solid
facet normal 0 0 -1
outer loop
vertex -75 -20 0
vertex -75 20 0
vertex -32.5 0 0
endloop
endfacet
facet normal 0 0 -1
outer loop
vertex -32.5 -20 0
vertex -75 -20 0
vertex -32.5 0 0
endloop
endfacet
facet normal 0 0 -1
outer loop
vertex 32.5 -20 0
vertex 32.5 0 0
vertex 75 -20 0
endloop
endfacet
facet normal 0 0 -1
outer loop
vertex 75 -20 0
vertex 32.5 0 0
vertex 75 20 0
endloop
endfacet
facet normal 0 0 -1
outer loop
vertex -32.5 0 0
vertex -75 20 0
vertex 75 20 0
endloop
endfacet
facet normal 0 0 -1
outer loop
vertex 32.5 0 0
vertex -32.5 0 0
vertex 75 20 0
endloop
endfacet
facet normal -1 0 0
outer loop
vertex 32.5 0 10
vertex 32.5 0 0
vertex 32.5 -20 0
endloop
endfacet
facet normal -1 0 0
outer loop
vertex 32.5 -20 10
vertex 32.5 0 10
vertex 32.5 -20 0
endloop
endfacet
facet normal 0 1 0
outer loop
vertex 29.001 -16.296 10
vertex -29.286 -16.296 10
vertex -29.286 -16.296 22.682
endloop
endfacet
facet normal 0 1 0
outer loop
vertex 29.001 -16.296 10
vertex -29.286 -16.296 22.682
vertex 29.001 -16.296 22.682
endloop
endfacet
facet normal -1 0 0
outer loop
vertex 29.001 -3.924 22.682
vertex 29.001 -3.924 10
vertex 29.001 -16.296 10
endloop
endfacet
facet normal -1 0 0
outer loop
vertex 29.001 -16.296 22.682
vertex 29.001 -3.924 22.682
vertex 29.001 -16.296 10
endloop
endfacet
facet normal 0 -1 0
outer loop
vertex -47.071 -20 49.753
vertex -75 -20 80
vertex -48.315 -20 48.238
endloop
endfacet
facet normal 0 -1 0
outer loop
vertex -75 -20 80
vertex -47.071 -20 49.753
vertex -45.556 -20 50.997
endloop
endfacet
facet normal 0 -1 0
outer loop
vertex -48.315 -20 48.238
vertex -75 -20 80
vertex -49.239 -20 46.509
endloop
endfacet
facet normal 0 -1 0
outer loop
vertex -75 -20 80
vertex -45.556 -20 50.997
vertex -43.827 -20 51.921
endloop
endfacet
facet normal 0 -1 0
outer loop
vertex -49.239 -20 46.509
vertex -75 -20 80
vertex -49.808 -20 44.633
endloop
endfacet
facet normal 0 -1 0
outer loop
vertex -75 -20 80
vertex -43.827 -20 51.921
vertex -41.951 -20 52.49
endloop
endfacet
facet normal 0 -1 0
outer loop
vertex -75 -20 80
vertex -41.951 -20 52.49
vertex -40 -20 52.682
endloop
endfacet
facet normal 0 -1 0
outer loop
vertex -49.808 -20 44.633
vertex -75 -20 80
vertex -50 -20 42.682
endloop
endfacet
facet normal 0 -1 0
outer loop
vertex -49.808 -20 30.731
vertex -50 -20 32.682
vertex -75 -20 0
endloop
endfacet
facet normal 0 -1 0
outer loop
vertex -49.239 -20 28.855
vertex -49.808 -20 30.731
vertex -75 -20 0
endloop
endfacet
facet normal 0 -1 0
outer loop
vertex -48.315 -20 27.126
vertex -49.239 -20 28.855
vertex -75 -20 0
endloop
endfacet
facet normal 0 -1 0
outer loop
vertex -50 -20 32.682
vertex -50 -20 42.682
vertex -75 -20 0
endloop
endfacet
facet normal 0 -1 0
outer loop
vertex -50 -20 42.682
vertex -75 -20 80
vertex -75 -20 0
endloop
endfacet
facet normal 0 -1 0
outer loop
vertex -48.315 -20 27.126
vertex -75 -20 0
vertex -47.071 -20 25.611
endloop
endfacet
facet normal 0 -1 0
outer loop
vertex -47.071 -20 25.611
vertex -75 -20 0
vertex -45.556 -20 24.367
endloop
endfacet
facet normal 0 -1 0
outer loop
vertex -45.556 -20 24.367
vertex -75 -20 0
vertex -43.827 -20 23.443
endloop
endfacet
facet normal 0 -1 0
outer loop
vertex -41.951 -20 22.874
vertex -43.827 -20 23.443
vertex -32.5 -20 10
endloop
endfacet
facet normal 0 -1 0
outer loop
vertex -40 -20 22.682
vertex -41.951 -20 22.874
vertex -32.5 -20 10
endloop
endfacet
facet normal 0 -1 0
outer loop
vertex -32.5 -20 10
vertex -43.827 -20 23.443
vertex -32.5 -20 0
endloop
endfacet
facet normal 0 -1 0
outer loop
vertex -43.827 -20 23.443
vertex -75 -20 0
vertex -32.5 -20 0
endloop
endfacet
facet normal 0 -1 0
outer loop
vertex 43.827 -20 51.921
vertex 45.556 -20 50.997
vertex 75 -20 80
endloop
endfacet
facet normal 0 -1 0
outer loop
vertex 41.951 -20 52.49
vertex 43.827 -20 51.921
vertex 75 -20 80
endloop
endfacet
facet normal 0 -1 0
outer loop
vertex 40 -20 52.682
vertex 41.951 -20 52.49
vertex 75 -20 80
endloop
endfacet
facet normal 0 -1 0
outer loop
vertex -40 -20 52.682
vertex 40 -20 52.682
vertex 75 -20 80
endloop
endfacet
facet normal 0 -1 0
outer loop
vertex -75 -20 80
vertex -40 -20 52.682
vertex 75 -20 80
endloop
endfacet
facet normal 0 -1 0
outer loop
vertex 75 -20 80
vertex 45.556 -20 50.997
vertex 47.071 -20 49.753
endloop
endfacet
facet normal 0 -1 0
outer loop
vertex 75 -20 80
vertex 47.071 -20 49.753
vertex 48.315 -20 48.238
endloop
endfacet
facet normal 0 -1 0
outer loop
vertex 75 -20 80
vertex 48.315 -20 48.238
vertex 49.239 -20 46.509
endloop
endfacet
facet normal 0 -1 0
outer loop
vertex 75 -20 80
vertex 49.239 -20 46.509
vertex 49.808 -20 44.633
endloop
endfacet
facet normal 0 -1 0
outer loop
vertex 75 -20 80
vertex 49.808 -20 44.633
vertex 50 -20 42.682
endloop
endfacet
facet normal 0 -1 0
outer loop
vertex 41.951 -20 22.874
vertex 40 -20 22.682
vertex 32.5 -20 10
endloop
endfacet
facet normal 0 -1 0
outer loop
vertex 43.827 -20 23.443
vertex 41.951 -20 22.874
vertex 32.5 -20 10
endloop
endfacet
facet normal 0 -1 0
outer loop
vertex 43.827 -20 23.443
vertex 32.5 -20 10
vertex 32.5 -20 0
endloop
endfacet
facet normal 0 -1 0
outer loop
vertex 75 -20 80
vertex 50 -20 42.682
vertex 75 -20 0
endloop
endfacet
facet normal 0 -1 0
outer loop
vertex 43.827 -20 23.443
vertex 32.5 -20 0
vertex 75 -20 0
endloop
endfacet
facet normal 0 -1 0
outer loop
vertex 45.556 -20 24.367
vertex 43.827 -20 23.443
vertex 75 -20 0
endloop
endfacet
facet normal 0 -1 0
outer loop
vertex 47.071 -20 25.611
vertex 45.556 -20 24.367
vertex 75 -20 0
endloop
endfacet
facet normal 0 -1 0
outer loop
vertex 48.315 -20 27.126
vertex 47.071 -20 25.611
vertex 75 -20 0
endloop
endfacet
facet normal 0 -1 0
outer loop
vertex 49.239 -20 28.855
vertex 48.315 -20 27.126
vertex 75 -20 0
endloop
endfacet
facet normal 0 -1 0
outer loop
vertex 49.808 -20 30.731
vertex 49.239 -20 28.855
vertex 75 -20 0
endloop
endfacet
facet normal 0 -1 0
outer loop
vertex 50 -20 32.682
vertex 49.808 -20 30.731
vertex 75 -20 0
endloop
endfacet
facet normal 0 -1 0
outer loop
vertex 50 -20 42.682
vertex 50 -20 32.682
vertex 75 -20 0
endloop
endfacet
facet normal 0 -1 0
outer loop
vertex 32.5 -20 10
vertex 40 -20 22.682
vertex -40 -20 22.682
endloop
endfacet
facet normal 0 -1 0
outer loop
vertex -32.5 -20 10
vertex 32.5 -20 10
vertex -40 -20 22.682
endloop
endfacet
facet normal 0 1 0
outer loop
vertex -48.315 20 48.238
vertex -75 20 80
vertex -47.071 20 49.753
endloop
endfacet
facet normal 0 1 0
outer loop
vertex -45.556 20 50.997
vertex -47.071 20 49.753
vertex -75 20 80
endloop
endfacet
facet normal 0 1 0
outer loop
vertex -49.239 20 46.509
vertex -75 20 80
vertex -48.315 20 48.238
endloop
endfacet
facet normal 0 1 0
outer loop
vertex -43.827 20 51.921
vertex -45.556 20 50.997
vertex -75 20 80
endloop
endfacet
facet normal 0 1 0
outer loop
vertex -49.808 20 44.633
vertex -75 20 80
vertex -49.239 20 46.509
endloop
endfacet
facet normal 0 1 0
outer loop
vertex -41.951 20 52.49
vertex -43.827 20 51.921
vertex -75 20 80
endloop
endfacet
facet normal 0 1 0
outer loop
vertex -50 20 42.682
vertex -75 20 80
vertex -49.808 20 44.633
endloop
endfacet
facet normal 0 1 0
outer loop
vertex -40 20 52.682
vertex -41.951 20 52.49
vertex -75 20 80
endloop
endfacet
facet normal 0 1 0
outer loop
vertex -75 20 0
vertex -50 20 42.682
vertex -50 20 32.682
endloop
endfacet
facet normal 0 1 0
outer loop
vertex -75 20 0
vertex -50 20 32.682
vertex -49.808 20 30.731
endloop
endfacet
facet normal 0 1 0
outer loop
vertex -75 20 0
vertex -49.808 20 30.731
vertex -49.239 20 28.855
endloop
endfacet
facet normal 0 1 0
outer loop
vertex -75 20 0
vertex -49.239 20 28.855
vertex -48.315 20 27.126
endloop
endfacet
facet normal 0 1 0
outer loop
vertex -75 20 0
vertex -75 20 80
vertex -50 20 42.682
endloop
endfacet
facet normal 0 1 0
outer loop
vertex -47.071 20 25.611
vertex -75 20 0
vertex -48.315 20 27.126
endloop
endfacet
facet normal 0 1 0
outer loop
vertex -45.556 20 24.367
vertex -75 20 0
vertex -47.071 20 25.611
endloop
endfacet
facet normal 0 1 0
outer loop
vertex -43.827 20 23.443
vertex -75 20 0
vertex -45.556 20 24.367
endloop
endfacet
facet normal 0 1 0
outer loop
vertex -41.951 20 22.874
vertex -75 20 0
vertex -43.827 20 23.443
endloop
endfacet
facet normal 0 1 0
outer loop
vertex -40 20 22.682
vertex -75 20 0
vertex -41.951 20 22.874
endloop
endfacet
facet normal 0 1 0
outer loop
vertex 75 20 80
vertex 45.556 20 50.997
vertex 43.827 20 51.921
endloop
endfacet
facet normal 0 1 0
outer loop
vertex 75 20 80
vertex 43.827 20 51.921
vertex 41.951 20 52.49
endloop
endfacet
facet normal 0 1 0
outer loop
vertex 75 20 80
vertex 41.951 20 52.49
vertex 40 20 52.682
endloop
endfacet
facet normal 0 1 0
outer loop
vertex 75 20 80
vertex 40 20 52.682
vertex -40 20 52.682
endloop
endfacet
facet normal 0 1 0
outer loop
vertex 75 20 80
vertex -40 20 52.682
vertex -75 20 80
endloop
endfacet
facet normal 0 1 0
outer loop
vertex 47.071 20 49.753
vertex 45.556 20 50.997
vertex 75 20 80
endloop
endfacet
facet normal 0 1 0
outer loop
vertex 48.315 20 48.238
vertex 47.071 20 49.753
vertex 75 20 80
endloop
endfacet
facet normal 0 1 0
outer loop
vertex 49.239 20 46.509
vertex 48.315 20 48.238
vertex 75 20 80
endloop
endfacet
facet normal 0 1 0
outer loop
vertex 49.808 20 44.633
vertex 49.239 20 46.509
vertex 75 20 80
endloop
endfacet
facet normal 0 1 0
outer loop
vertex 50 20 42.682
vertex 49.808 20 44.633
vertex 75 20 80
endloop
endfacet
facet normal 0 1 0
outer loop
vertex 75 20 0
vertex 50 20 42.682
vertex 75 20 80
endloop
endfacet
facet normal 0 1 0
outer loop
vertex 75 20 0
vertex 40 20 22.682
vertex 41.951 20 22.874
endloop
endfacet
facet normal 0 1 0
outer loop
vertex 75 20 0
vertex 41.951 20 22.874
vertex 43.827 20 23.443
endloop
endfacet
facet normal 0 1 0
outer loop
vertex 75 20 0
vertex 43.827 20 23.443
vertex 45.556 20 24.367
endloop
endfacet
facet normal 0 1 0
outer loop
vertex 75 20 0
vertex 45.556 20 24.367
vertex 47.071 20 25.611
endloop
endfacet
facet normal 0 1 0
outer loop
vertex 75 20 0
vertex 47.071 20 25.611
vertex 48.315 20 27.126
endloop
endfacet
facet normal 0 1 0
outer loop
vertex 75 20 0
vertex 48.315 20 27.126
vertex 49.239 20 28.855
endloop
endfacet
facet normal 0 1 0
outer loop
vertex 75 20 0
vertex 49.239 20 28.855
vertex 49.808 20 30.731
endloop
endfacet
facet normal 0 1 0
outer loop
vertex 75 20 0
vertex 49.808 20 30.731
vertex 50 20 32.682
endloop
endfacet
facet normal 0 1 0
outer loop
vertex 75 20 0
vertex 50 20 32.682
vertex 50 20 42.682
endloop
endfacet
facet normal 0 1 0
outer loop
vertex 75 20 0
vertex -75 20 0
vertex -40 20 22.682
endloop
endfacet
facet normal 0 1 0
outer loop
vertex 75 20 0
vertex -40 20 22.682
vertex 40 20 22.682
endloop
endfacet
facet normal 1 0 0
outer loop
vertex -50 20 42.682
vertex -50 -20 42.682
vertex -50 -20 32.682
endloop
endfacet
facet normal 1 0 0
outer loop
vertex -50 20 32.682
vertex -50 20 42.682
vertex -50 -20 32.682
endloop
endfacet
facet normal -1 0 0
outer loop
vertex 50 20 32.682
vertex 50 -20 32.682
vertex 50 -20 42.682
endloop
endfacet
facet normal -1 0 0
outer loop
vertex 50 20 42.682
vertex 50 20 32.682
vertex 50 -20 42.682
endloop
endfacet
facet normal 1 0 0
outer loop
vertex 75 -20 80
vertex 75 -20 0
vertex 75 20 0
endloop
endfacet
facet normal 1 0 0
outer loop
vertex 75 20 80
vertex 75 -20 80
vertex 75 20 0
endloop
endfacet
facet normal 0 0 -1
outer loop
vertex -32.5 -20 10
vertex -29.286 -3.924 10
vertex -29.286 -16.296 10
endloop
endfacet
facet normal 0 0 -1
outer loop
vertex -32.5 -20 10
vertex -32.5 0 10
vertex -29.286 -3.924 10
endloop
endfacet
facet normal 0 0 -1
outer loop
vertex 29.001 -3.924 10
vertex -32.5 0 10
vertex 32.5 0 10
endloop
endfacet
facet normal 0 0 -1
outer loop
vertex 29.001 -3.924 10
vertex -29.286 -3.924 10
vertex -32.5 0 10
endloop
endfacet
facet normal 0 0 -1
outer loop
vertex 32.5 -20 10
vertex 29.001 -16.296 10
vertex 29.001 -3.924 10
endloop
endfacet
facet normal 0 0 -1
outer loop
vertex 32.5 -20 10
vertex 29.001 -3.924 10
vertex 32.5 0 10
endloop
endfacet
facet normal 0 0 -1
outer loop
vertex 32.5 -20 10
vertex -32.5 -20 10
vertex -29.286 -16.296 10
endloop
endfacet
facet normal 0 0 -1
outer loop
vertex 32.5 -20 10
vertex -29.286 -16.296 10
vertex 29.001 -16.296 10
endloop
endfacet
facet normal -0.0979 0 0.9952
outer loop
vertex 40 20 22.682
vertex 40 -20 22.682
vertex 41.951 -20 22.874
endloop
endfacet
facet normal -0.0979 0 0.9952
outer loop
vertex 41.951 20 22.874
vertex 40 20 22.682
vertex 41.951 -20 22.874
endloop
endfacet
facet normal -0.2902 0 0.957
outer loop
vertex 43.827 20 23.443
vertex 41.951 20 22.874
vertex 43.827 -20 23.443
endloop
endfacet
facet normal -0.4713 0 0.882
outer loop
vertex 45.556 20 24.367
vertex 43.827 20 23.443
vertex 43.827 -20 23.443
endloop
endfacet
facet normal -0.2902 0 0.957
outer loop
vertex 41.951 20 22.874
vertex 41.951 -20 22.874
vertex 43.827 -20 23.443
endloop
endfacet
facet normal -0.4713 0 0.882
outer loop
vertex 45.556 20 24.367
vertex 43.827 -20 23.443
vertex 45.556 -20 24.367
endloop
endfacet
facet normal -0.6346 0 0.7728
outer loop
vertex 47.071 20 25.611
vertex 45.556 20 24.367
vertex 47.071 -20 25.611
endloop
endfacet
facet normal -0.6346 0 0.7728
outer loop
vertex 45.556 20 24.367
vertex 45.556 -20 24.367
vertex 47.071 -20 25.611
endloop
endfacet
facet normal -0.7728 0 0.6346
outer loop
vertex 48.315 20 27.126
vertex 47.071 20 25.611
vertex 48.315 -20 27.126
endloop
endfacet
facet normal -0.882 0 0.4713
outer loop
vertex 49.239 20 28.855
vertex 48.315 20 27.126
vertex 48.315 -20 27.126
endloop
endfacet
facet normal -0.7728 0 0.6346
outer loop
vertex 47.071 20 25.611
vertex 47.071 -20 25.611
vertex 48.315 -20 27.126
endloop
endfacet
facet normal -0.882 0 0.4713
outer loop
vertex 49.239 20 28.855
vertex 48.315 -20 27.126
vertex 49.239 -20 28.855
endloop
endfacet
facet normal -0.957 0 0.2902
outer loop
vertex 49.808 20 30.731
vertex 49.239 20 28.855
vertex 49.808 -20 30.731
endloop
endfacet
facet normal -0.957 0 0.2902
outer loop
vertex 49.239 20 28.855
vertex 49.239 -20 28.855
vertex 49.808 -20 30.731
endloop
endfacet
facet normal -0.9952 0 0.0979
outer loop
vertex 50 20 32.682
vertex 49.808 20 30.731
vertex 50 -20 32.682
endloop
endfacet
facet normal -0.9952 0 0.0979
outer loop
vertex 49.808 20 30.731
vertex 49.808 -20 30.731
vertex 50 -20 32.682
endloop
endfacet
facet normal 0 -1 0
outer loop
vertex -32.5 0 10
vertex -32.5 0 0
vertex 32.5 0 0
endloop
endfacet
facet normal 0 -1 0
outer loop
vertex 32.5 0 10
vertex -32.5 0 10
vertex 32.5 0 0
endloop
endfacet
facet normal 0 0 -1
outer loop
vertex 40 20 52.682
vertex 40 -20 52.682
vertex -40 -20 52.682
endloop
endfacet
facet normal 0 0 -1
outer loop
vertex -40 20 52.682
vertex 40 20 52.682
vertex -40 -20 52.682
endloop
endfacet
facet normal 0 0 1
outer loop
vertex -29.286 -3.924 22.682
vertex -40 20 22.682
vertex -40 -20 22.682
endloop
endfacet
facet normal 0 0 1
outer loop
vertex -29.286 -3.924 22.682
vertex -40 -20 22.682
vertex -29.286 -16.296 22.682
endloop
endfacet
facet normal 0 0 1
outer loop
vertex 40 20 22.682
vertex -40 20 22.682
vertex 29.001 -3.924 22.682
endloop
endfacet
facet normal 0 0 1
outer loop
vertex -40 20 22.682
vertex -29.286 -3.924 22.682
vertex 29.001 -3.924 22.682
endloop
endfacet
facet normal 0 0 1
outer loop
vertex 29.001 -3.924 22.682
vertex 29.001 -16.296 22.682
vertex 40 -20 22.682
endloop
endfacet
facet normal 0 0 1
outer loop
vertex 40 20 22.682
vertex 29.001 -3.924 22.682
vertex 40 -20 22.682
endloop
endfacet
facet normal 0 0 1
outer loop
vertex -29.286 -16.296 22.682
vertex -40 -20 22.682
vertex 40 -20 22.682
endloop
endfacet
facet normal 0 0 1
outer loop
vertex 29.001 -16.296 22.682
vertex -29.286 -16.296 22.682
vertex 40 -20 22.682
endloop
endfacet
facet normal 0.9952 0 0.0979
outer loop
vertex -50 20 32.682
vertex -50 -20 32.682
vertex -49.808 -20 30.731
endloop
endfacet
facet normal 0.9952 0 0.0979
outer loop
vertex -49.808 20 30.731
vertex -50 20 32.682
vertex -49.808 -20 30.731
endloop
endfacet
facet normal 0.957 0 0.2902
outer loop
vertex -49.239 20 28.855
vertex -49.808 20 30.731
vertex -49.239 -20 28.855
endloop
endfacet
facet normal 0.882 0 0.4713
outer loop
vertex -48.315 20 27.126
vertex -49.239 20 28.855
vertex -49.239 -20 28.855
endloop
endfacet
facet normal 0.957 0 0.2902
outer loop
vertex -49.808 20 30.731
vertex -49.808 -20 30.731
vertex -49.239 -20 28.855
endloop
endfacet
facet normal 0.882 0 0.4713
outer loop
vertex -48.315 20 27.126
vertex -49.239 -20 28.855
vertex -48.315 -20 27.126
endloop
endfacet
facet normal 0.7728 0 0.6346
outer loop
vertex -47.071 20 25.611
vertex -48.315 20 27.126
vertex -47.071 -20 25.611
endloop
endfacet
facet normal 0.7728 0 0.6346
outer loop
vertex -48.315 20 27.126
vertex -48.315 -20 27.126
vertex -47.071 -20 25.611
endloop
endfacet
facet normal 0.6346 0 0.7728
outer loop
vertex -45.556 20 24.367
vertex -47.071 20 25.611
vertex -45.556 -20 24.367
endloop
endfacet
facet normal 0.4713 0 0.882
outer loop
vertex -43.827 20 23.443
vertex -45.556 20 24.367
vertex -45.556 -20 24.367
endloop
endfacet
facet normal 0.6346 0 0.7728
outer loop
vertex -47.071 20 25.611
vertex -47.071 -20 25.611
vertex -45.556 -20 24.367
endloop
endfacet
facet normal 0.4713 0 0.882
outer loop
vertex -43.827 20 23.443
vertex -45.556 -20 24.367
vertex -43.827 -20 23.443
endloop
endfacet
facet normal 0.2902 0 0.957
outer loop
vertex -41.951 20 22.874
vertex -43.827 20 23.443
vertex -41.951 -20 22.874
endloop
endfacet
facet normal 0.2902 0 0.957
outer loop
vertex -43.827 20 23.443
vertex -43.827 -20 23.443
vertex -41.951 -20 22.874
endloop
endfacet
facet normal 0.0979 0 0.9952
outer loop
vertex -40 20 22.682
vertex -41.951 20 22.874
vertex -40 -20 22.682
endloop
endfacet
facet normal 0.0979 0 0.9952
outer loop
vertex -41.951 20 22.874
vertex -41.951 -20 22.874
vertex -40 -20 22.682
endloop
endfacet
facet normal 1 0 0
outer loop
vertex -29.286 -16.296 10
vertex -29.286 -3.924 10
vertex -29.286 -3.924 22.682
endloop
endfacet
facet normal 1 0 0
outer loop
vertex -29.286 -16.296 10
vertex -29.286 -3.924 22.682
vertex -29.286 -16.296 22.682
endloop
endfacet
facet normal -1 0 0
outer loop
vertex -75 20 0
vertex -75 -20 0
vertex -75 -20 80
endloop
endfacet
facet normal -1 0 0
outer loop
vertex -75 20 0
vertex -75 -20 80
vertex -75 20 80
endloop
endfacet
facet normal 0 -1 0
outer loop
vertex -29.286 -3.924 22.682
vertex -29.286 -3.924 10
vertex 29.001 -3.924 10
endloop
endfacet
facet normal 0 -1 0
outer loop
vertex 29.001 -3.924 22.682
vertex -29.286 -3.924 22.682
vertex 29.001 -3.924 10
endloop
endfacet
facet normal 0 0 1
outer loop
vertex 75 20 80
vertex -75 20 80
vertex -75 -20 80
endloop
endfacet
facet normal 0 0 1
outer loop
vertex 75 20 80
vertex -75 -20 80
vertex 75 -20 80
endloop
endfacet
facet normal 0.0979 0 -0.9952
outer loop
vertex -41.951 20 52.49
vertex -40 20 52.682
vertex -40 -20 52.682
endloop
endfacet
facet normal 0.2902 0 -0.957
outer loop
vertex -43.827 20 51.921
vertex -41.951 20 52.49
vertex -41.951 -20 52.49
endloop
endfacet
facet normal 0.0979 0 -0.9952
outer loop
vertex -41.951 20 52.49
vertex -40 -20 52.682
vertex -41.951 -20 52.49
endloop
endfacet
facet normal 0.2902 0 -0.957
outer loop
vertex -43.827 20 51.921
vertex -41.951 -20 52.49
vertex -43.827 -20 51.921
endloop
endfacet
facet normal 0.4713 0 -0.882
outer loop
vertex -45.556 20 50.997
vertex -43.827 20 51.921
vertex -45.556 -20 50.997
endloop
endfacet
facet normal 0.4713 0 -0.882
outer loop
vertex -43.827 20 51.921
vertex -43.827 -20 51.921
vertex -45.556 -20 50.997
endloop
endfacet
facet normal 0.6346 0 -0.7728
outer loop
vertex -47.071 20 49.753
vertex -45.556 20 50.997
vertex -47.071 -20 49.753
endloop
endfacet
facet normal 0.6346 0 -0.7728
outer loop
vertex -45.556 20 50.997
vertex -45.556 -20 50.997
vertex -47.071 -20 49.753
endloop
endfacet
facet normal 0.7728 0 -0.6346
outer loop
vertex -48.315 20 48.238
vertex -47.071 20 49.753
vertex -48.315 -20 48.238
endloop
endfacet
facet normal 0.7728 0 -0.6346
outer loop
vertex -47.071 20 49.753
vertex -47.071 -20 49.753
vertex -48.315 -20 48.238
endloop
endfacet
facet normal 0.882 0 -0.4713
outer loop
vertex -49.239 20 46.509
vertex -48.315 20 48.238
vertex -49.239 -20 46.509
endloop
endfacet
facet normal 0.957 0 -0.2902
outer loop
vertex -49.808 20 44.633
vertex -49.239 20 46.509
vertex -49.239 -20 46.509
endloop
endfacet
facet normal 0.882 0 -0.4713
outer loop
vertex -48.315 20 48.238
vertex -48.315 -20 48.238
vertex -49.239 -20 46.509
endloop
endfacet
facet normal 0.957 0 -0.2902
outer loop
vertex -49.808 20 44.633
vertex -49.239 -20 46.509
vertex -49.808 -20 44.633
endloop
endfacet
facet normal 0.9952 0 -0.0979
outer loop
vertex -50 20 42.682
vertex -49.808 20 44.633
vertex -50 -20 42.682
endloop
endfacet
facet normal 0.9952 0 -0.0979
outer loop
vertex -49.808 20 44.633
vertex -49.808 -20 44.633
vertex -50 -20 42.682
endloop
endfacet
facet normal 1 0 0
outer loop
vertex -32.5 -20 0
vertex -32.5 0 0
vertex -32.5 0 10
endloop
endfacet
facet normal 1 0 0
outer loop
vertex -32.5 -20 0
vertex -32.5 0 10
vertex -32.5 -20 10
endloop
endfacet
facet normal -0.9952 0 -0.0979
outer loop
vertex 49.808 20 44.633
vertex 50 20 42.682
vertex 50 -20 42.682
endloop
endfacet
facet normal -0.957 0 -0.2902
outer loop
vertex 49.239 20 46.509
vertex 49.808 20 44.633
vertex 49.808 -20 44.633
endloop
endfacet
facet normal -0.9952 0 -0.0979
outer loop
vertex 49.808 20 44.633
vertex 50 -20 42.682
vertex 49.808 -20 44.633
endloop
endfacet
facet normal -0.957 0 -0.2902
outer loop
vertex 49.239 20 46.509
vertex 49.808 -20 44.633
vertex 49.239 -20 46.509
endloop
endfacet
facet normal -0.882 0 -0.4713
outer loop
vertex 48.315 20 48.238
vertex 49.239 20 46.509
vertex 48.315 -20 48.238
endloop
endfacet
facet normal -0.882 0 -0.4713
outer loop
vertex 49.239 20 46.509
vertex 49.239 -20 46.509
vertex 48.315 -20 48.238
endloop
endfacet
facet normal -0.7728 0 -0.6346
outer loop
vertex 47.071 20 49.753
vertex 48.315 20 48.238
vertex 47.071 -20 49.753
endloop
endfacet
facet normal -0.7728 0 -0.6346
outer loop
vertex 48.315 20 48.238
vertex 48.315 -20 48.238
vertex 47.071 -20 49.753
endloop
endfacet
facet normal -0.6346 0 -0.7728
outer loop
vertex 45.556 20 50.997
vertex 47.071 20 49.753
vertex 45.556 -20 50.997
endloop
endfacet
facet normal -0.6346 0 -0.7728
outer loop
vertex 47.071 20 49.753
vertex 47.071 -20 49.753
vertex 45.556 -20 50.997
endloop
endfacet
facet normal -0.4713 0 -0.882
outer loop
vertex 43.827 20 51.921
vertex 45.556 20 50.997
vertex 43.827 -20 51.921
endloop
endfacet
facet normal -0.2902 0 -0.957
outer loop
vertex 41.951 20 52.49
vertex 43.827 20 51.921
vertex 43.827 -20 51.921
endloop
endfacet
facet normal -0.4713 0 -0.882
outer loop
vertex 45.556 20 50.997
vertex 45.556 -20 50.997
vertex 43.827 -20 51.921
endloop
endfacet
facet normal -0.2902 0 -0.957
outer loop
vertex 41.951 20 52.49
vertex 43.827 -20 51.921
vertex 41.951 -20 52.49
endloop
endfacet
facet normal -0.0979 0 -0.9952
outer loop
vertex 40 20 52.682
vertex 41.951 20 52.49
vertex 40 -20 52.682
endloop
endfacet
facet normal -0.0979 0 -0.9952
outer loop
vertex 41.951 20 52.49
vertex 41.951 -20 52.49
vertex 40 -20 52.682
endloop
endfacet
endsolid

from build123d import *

# Parameters (mm, degrees)
F0_W     = 150
F0_H     = 40
F1_DEPTH = 80
F2_W     = 65
F2_H     = 20
F3_DEPTH = 10
F5_DEPTH = 264.4
F6_W     = 58.287583
F6_H     = 12.372349
F7_DEPTH = 25


with BuildPart() as f1:
    # F0 (on Top) → F1 (new body)
    with BuildSketch(Plane.XY):
        Rectangle(F0_W, F0_H)
    extrude(amount=F1_DEPTH)

    # F2 (on face) → F3 (cut)
    with BuildSketch(Plane(origin=(0, 0, 0), x_dir=(1, 0, 0), z_dir=(0, 0, -1))):
        with Locations((0, 10)):
            Rectangle(F2_W, F2_H)
    extrude(amount=-F3_DEPTH, mode=Mode.SUBTRACT)

    # F4 (on face) → F5 (cut)
    with BuildSketch(Plane.XZ.offset(20)):
        with BuildLine():
            Line((-40, 22.681816), (40, 22.681816))
            ThreePointArc((40, 22.681816), (47.071068, 25.610749), (50, 32.681816))
            Line((50, 32.681816), (50, 42.681816))
            ThreePointArc((50, 42.681816), (47.071068, 49.752884), (40, 52.681816))
            Line((40, 52.681816), (-40, 52.681816))
            ThreePointArc((-40, 52.681816), (-47.071068, 49.752884), (-50, 42.681816))
            Line((-50, 42.681816), (-50, 32.681816))
            ThreePointArc((-50, 32.681816), (-47.071068, 25.610749), (-40, 22.681816))
        make_face()
    extrude(amount=-F5_DEPTH, mode=Mode.SUBTRACT)

    # F6 (on face) → F7 (cut)
    with BuildSketch(Plane(origin=(0, 0, 10), x_dir=(1, 0, 0), z_dir=(0, 0, -1))):
        with Locations((-0.142549, 10.109945)):
            Rectangle(F6_W, F6_H)
    extrude(amount=-F7_DEPTH, mode=Mode.SUBTRACT)


solid = f1.part
